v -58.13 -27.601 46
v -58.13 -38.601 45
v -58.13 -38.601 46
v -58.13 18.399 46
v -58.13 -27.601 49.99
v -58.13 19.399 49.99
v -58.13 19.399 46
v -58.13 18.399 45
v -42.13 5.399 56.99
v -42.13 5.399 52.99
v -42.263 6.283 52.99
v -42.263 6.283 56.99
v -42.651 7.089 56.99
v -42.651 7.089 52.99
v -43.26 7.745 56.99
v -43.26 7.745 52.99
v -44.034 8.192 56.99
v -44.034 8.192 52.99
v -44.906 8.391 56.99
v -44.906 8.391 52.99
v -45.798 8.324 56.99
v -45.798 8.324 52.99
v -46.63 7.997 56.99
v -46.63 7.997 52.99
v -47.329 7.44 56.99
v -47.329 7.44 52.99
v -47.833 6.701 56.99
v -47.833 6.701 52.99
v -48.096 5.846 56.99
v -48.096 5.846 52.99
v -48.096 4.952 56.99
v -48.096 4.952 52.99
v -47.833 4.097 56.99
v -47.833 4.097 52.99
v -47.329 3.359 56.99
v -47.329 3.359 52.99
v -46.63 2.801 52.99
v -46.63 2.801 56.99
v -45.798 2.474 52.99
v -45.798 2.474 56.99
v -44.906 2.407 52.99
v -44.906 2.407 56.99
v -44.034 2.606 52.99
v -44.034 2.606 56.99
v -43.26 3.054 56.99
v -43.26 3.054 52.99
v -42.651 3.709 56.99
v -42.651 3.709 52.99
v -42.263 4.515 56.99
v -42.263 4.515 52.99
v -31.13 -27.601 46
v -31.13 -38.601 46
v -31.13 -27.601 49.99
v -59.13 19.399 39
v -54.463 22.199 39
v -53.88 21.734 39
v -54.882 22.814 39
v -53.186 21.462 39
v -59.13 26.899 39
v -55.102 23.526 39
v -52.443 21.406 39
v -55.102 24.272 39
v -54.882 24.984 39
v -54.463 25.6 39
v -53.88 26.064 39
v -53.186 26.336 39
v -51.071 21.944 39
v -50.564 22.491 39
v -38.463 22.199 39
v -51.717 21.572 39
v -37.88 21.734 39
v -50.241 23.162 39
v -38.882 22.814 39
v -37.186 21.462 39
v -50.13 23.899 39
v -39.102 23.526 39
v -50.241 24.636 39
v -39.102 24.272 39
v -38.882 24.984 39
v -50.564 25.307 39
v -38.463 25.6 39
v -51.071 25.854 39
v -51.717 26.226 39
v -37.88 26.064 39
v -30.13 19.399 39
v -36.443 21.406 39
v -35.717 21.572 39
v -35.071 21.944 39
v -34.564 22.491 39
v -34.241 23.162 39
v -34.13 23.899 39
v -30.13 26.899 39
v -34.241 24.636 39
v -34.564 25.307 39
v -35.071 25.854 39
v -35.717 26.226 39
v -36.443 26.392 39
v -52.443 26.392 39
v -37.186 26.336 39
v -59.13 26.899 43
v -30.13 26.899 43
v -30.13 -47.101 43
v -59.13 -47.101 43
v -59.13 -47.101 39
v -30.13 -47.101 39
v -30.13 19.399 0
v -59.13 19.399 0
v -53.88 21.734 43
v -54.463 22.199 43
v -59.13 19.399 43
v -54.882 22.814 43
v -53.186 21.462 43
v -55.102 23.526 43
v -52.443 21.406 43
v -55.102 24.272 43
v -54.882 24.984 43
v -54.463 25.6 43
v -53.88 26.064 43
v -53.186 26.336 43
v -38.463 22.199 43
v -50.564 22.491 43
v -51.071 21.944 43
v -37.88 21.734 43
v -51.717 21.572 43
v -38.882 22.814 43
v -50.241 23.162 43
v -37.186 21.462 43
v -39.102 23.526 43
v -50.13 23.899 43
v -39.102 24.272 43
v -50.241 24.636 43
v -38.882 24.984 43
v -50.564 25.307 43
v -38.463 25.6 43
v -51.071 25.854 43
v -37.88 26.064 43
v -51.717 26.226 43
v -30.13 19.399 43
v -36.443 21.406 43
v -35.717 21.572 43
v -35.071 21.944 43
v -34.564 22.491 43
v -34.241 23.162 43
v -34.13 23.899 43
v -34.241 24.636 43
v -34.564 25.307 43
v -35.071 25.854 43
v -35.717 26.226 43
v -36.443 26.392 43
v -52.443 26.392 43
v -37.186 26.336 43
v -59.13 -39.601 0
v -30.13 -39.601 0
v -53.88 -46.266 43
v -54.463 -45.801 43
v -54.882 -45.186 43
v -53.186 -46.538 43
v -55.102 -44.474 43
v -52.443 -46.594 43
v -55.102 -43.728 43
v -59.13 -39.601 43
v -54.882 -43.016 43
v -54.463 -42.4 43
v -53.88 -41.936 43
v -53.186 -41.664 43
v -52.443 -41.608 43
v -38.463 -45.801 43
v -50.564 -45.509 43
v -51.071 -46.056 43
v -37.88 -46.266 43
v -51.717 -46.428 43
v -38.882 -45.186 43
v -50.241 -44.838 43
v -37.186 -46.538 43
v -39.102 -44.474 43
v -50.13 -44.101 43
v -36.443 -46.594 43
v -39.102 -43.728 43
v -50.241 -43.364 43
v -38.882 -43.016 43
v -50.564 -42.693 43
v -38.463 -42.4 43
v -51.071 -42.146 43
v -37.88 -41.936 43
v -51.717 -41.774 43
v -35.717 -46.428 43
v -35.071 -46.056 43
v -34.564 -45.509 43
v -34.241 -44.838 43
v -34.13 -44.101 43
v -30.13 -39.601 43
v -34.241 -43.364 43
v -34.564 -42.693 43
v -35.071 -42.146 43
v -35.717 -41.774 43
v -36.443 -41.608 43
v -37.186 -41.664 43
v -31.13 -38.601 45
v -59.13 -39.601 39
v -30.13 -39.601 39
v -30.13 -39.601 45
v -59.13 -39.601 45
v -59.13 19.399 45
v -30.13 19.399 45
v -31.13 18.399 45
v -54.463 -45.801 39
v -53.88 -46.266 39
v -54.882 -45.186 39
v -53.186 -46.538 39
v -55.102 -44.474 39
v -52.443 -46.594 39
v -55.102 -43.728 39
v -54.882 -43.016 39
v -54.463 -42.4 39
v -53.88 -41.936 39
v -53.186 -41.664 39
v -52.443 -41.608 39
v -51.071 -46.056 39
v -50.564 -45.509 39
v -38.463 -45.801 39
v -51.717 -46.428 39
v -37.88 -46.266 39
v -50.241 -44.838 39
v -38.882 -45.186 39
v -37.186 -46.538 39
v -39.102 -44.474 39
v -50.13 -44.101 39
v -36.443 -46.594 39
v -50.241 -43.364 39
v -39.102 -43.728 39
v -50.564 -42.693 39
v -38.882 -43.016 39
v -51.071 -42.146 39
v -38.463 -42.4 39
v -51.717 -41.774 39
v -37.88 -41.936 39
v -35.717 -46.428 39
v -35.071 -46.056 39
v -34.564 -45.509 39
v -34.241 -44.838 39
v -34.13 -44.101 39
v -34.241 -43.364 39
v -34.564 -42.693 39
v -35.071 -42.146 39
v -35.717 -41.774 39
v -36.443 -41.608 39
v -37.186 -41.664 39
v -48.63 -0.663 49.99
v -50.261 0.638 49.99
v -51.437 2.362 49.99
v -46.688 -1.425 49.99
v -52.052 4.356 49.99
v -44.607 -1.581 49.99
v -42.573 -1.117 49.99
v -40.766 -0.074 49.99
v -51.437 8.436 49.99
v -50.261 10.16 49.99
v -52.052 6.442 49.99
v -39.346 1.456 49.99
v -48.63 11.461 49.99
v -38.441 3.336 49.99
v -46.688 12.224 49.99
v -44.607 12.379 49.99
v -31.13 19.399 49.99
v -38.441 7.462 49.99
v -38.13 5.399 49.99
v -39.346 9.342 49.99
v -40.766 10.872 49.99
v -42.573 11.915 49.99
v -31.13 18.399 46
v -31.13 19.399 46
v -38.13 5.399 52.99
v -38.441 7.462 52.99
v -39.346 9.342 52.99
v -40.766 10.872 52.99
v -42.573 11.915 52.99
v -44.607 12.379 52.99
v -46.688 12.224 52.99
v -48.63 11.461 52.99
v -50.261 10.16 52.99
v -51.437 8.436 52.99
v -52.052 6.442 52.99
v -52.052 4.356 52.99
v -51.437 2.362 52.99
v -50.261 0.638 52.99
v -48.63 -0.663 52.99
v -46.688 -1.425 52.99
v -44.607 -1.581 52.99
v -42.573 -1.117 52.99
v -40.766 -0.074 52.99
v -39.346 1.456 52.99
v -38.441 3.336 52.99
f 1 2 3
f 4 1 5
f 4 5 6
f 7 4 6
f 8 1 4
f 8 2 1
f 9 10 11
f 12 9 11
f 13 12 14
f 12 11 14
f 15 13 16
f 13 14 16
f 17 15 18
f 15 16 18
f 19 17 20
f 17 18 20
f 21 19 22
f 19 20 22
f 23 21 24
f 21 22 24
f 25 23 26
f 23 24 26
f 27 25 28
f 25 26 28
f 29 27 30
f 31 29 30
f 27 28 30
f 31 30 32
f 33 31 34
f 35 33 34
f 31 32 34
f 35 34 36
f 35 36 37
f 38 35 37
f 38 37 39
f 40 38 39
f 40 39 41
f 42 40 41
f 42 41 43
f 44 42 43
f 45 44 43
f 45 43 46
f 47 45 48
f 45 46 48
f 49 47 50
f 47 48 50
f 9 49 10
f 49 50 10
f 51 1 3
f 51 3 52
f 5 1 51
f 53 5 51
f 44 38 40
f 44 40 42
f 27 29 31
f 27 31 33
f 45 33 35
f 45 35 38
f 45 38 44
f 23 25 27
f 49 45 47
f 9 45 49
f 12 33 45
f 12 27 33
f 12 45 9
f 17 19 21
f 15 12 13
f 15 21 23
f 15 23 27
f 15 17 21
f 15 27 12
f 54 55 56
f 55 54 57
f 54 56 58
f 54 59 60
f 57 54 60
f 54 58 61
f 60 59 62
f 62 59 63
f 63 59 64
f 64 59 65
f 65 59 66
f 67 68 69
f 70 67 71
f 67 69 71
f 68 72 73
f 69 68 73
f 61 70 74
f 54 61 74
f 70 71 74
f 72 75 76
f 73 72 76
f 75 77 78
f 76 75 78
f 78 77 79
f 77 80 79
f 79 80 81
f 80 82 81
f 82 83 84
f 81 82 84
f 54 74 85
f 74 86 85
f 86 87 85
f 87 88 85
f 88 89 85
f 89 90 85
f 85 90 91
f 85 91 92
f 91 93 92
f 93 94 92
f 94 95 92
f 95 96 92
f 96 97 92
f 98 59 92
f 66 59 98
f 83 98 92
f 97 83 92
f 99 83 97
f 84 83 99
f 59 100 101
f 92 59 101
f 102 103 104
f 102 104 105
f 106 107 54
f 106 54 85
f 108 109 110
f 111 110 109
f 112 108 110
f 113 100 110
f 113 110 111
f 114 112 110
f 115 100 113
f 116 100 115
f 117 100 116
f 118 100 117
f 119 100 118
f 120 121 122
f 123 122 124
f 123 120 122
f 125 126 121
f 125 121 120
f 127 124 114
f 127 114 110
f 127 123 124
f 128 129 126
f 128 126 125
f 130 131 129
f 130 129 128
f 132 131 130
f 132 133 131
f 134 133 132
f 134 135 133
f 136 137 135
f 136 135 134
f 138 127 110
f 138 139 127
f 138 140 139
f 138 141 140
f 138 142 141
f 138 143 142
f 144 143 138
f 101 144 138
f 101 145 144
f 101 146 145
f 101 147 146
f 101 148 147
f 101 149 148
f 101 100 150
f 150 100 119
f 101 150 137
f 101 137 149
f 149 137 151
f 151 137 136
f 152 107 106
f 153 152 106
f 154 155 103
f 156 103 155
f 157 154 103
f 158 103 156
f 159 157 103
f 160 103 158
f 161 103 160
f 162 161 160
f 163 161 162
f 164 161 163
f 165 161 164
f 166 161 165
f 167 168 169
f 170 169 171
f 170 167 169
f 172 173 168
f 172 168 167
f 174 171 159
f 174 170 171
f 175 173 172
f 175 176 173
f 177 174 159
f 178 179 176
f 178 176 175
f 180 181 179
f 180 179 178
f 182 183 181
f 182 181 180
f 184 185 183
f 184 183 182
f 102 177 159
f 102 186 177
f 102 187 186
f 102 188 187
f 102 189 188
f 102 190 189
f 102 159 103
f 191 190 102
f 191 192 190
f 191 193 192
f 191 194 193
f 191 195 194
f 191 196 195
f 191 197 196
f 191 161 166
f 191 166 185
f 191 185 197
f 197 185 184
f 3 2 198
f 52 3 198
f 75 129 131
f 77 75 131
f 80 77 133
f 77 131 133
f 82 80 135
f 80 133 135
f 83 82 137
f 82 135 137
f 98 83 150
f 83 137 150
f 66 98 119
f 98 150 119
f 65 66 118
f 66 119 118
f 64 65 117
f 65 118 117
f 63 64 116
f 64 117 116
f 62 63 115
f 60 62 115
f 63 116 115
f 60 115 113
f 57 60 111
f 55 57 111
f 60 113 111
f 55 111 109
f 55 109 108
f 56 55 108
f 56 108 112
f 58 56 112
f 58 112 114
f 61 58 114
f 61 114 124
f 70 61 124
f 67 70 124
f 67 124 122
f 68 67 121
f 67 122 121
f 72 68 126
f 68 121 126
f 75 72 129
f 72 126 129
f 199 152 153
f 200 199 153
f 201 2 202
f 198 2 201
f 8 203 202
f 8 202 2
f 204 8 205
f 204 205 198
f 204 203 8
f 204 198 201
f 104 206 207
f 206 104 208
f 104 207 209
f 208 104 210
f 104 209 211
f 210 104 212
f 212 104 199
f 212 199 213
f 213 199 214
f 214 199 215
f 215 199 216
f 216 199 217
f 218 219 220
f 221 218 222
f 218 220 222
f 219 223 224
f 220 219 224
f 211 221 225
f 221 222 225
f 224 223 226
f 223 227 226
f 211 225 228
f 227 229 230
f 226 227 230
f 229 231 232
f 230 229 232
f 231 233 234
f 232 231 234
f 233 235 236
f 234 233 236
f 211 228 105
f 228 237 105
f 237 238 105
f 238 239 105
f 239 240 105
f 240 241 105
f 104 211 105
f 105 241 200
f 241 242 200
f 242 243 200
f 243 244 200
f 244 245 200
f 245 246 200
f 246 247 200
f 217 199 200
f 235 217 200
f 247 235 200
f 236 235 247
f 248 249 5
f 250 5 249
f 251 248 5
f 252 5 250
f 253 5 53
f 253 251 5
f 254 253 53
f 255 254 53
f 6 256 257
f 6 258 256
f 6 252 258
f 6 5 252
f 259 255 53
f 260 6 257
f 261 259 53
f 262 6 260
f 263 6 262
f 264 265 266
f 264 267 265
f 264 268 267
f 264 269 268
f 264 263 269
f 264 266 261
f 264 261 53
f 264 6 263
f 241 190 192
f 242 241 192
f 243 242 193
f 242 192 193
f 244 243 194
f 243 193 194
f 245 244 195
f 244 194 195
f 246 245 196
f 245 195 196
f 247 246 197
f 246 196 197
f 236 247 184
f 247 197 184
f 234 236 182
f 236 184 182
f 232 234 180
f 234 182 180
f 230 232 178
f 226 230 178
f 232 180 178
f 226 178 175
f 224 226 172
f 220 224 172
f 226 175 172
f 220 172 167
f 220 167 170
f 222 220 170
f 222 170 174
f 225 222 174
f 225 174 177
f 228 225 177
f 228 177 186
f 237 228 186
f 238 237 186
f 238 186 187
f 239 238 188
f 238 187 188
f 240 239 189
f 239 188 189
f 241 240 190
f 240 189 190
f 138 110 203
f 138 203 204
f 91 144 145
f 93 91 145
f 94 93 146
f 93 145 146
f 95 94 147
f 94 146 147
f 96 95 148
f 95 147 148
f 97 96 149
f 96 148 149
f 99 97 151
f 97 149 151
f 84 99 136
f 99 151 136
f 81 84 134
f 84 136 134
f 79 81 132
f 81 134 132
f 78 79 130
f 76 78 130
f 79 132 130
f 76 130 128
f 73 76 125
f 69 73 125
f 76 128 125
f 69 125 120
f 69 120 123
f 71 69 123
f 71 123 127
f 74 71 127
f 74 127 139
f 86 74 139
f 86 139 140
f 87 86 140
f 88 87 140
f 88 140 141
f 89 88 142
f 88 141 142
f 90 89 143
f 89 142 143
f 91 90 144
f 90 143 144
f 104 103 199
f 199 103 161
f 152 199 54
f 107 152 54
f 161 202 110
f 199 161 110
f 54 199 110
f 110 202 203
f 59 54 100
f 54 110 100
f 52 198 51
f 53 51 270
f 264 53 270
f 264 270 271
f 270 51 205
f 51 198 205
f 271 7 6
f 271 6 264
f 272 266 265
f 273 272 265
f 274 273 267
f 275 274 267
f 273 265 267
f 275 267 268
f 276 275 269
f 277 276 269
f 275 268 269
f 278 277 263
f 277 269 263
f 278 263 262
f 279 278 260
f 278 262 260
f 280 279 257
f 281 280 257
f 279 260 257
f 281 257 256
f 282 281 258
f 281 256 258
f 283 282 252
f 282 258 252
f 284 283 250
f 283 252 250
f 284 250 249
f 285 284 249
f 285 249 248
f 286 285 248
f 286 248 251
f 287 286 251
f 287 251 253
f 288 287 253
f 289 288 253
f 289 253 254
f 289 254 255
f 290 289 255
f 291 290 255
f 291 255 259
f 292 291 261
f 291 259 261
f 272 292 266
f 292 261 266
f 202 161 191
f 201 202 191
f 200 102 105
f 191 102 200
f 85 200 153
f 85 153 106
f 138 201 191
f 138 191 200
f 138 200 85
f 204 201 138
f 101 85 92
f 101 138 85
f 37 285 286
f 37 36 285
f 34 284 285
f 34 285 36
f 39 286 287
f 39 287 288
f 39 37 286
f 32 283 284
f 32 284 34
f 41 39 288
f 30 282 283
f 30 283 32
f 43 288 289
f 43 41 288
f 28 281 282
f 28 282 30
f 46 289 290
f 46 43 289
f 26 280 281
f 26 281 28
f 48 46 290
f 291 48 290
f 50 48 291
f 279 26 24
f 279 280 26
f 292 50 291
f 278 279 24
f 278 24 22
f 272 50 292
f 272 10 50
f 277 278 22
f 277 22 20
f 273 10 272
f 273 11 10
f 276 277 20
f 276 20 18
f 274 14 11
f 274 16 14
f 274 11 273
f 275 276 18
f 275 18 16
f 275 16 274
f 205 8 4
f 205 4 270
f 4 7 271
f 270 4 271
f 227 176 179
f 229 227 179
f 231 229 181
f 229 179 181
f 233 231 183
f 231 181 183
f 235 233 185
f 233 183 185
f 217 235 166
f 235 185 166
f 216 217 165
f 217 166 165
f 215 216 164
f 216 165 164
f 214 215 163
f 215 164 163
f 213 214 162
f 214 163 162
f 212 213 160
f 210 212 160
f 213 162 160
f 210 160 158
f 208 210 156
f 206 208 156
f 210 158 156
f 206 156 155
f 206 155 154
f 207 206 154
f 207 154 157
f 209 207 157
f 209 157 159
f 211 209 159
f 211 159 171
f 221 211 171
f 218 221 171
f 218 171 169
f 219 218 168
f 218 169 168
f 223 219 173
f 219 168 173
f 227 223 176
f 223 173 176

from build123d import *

# Parameters (mm, degrees)
SKETCH4_W           = 29
SKETCH4_H           = 59
BOSS_EXTRUDE2_DEPTH = 43
SKETCH5_W           = 29
SKETCH5_H           = 74
BOSS_EXTRUDE3_DEPTH = 4
SKETCH6_W           = 29
SKETCH6_H           = 59
BOSS_EXTRUDE4_DEPTH = 2
SKETCH7_W           = 27
SKETCH7_H           = 57
BOSS_EXTRUDE5_DEPTH = 1
SKETCH8_W           = 27
SKETCH8_H           = 47
BOSS_EXTRUDE7_DEPTH = 3.99
SKETCH11_R          = 7
BOSS_EXTRUDE8_DEPTH = 3
SKETCH12_R          = 3
BOSS_EXTRUDE9_DEPTH = 4
SKETCH13_R          = 2.5
CUT_EXTRUDE1_DEPTH  = 4


with BuildPart() as part:
    # Sketch4 → Boss-Extrude2 (new body)
    with BuildSketch(Plane.XY):
        with Locations((-44.629997068, -10.100928214)):
            Rectangle(SKETCH4_W, SKETCH4_H)
    extrude(amount=BOSS_EXTRUDE2_DEPTH)

    # Sketch5 → Boss-Extrude3 (add)
    with BuildSketch(Plane.XY.offset(43)):
        with Locations((-44.629997068, -10.100928214)):
            Rectangle(SKETCH5_W, SKETCH5_H)
    extrude(amount=-BOSS_EXTRUDE3_DEPTH)

    # Sketch6 → Boss-Extrude4 (add)
    with BuildSketch(Plane.XY.offset(43)):
        with Locations((-44.629997068, -10.100928214)):
            Rectangle(SKETCH6_W, SKETCH6_H)
    extrude(amount=BOSS_EXTRUDE4_DEPTH)

    # Sketch7 → Boss-Extrude5 (add)
    with BuildSketch(Plane.XY.offset(45)):
        with Locations((-44.629997068, -10.100928214)):
            Rectangle(SKETCH7_W, SKETCH7_H)
    extrude(amount=BOSS_EXTRUDE5_DEPTH)

    # Sketch8 → Boss-Extrude7 (add)
    with BuildSketch(Plane.XY.offset(46)):
        with Locations((-44.629997068, -4.100928214)):
            Rectangle(SKETCH8_W, SKETCH8_H)
    extrude(amount=BOSS_EXTRUDE7_DEPTH)

    # Sketch11 → Boss-Extrude8 (add)
    with BuildSketch(Plane.XY.offset(49.99)):
        with Locations((-45.129997068, 5.399071786)):
            Circle(SKETCH11_R)
    extrude(amount=BOSS_EXTRUDE8_DEPTH)

    # Sketch12 → Boss-Extrude9 (add)
    with BuildSketch(Plane.XY.offset(52.99)):
        with Locations((-45.129997068, 5.399071786)):
            Circle(SKETCH12_R)
    extrude(amount=BOSS_EXTRUDE9_DEPTH)

    # Sketch13 → Cut-Extrude1 (cut)
    with BuildSketch(Plane.XY.offset(43)):
        with Locations((-36.629997068, 23.899071786)):
            Circle(SKETCH13_R)
        with Locations((-52.629997068, 23.899071786)):
            Circle(SKETCH13_R)
        with Locations((-52.629997068, -44.100928214)):
            Circle(SKETCH13_R)
        with Locations((-36.629997068, -44.100928214)):
            Circle(SKETCH13_R)
    extrude(amount=-CUT_EXTRUDE1_DEPTH, mode=Mode.SUBTRACT)


solid = part.part
